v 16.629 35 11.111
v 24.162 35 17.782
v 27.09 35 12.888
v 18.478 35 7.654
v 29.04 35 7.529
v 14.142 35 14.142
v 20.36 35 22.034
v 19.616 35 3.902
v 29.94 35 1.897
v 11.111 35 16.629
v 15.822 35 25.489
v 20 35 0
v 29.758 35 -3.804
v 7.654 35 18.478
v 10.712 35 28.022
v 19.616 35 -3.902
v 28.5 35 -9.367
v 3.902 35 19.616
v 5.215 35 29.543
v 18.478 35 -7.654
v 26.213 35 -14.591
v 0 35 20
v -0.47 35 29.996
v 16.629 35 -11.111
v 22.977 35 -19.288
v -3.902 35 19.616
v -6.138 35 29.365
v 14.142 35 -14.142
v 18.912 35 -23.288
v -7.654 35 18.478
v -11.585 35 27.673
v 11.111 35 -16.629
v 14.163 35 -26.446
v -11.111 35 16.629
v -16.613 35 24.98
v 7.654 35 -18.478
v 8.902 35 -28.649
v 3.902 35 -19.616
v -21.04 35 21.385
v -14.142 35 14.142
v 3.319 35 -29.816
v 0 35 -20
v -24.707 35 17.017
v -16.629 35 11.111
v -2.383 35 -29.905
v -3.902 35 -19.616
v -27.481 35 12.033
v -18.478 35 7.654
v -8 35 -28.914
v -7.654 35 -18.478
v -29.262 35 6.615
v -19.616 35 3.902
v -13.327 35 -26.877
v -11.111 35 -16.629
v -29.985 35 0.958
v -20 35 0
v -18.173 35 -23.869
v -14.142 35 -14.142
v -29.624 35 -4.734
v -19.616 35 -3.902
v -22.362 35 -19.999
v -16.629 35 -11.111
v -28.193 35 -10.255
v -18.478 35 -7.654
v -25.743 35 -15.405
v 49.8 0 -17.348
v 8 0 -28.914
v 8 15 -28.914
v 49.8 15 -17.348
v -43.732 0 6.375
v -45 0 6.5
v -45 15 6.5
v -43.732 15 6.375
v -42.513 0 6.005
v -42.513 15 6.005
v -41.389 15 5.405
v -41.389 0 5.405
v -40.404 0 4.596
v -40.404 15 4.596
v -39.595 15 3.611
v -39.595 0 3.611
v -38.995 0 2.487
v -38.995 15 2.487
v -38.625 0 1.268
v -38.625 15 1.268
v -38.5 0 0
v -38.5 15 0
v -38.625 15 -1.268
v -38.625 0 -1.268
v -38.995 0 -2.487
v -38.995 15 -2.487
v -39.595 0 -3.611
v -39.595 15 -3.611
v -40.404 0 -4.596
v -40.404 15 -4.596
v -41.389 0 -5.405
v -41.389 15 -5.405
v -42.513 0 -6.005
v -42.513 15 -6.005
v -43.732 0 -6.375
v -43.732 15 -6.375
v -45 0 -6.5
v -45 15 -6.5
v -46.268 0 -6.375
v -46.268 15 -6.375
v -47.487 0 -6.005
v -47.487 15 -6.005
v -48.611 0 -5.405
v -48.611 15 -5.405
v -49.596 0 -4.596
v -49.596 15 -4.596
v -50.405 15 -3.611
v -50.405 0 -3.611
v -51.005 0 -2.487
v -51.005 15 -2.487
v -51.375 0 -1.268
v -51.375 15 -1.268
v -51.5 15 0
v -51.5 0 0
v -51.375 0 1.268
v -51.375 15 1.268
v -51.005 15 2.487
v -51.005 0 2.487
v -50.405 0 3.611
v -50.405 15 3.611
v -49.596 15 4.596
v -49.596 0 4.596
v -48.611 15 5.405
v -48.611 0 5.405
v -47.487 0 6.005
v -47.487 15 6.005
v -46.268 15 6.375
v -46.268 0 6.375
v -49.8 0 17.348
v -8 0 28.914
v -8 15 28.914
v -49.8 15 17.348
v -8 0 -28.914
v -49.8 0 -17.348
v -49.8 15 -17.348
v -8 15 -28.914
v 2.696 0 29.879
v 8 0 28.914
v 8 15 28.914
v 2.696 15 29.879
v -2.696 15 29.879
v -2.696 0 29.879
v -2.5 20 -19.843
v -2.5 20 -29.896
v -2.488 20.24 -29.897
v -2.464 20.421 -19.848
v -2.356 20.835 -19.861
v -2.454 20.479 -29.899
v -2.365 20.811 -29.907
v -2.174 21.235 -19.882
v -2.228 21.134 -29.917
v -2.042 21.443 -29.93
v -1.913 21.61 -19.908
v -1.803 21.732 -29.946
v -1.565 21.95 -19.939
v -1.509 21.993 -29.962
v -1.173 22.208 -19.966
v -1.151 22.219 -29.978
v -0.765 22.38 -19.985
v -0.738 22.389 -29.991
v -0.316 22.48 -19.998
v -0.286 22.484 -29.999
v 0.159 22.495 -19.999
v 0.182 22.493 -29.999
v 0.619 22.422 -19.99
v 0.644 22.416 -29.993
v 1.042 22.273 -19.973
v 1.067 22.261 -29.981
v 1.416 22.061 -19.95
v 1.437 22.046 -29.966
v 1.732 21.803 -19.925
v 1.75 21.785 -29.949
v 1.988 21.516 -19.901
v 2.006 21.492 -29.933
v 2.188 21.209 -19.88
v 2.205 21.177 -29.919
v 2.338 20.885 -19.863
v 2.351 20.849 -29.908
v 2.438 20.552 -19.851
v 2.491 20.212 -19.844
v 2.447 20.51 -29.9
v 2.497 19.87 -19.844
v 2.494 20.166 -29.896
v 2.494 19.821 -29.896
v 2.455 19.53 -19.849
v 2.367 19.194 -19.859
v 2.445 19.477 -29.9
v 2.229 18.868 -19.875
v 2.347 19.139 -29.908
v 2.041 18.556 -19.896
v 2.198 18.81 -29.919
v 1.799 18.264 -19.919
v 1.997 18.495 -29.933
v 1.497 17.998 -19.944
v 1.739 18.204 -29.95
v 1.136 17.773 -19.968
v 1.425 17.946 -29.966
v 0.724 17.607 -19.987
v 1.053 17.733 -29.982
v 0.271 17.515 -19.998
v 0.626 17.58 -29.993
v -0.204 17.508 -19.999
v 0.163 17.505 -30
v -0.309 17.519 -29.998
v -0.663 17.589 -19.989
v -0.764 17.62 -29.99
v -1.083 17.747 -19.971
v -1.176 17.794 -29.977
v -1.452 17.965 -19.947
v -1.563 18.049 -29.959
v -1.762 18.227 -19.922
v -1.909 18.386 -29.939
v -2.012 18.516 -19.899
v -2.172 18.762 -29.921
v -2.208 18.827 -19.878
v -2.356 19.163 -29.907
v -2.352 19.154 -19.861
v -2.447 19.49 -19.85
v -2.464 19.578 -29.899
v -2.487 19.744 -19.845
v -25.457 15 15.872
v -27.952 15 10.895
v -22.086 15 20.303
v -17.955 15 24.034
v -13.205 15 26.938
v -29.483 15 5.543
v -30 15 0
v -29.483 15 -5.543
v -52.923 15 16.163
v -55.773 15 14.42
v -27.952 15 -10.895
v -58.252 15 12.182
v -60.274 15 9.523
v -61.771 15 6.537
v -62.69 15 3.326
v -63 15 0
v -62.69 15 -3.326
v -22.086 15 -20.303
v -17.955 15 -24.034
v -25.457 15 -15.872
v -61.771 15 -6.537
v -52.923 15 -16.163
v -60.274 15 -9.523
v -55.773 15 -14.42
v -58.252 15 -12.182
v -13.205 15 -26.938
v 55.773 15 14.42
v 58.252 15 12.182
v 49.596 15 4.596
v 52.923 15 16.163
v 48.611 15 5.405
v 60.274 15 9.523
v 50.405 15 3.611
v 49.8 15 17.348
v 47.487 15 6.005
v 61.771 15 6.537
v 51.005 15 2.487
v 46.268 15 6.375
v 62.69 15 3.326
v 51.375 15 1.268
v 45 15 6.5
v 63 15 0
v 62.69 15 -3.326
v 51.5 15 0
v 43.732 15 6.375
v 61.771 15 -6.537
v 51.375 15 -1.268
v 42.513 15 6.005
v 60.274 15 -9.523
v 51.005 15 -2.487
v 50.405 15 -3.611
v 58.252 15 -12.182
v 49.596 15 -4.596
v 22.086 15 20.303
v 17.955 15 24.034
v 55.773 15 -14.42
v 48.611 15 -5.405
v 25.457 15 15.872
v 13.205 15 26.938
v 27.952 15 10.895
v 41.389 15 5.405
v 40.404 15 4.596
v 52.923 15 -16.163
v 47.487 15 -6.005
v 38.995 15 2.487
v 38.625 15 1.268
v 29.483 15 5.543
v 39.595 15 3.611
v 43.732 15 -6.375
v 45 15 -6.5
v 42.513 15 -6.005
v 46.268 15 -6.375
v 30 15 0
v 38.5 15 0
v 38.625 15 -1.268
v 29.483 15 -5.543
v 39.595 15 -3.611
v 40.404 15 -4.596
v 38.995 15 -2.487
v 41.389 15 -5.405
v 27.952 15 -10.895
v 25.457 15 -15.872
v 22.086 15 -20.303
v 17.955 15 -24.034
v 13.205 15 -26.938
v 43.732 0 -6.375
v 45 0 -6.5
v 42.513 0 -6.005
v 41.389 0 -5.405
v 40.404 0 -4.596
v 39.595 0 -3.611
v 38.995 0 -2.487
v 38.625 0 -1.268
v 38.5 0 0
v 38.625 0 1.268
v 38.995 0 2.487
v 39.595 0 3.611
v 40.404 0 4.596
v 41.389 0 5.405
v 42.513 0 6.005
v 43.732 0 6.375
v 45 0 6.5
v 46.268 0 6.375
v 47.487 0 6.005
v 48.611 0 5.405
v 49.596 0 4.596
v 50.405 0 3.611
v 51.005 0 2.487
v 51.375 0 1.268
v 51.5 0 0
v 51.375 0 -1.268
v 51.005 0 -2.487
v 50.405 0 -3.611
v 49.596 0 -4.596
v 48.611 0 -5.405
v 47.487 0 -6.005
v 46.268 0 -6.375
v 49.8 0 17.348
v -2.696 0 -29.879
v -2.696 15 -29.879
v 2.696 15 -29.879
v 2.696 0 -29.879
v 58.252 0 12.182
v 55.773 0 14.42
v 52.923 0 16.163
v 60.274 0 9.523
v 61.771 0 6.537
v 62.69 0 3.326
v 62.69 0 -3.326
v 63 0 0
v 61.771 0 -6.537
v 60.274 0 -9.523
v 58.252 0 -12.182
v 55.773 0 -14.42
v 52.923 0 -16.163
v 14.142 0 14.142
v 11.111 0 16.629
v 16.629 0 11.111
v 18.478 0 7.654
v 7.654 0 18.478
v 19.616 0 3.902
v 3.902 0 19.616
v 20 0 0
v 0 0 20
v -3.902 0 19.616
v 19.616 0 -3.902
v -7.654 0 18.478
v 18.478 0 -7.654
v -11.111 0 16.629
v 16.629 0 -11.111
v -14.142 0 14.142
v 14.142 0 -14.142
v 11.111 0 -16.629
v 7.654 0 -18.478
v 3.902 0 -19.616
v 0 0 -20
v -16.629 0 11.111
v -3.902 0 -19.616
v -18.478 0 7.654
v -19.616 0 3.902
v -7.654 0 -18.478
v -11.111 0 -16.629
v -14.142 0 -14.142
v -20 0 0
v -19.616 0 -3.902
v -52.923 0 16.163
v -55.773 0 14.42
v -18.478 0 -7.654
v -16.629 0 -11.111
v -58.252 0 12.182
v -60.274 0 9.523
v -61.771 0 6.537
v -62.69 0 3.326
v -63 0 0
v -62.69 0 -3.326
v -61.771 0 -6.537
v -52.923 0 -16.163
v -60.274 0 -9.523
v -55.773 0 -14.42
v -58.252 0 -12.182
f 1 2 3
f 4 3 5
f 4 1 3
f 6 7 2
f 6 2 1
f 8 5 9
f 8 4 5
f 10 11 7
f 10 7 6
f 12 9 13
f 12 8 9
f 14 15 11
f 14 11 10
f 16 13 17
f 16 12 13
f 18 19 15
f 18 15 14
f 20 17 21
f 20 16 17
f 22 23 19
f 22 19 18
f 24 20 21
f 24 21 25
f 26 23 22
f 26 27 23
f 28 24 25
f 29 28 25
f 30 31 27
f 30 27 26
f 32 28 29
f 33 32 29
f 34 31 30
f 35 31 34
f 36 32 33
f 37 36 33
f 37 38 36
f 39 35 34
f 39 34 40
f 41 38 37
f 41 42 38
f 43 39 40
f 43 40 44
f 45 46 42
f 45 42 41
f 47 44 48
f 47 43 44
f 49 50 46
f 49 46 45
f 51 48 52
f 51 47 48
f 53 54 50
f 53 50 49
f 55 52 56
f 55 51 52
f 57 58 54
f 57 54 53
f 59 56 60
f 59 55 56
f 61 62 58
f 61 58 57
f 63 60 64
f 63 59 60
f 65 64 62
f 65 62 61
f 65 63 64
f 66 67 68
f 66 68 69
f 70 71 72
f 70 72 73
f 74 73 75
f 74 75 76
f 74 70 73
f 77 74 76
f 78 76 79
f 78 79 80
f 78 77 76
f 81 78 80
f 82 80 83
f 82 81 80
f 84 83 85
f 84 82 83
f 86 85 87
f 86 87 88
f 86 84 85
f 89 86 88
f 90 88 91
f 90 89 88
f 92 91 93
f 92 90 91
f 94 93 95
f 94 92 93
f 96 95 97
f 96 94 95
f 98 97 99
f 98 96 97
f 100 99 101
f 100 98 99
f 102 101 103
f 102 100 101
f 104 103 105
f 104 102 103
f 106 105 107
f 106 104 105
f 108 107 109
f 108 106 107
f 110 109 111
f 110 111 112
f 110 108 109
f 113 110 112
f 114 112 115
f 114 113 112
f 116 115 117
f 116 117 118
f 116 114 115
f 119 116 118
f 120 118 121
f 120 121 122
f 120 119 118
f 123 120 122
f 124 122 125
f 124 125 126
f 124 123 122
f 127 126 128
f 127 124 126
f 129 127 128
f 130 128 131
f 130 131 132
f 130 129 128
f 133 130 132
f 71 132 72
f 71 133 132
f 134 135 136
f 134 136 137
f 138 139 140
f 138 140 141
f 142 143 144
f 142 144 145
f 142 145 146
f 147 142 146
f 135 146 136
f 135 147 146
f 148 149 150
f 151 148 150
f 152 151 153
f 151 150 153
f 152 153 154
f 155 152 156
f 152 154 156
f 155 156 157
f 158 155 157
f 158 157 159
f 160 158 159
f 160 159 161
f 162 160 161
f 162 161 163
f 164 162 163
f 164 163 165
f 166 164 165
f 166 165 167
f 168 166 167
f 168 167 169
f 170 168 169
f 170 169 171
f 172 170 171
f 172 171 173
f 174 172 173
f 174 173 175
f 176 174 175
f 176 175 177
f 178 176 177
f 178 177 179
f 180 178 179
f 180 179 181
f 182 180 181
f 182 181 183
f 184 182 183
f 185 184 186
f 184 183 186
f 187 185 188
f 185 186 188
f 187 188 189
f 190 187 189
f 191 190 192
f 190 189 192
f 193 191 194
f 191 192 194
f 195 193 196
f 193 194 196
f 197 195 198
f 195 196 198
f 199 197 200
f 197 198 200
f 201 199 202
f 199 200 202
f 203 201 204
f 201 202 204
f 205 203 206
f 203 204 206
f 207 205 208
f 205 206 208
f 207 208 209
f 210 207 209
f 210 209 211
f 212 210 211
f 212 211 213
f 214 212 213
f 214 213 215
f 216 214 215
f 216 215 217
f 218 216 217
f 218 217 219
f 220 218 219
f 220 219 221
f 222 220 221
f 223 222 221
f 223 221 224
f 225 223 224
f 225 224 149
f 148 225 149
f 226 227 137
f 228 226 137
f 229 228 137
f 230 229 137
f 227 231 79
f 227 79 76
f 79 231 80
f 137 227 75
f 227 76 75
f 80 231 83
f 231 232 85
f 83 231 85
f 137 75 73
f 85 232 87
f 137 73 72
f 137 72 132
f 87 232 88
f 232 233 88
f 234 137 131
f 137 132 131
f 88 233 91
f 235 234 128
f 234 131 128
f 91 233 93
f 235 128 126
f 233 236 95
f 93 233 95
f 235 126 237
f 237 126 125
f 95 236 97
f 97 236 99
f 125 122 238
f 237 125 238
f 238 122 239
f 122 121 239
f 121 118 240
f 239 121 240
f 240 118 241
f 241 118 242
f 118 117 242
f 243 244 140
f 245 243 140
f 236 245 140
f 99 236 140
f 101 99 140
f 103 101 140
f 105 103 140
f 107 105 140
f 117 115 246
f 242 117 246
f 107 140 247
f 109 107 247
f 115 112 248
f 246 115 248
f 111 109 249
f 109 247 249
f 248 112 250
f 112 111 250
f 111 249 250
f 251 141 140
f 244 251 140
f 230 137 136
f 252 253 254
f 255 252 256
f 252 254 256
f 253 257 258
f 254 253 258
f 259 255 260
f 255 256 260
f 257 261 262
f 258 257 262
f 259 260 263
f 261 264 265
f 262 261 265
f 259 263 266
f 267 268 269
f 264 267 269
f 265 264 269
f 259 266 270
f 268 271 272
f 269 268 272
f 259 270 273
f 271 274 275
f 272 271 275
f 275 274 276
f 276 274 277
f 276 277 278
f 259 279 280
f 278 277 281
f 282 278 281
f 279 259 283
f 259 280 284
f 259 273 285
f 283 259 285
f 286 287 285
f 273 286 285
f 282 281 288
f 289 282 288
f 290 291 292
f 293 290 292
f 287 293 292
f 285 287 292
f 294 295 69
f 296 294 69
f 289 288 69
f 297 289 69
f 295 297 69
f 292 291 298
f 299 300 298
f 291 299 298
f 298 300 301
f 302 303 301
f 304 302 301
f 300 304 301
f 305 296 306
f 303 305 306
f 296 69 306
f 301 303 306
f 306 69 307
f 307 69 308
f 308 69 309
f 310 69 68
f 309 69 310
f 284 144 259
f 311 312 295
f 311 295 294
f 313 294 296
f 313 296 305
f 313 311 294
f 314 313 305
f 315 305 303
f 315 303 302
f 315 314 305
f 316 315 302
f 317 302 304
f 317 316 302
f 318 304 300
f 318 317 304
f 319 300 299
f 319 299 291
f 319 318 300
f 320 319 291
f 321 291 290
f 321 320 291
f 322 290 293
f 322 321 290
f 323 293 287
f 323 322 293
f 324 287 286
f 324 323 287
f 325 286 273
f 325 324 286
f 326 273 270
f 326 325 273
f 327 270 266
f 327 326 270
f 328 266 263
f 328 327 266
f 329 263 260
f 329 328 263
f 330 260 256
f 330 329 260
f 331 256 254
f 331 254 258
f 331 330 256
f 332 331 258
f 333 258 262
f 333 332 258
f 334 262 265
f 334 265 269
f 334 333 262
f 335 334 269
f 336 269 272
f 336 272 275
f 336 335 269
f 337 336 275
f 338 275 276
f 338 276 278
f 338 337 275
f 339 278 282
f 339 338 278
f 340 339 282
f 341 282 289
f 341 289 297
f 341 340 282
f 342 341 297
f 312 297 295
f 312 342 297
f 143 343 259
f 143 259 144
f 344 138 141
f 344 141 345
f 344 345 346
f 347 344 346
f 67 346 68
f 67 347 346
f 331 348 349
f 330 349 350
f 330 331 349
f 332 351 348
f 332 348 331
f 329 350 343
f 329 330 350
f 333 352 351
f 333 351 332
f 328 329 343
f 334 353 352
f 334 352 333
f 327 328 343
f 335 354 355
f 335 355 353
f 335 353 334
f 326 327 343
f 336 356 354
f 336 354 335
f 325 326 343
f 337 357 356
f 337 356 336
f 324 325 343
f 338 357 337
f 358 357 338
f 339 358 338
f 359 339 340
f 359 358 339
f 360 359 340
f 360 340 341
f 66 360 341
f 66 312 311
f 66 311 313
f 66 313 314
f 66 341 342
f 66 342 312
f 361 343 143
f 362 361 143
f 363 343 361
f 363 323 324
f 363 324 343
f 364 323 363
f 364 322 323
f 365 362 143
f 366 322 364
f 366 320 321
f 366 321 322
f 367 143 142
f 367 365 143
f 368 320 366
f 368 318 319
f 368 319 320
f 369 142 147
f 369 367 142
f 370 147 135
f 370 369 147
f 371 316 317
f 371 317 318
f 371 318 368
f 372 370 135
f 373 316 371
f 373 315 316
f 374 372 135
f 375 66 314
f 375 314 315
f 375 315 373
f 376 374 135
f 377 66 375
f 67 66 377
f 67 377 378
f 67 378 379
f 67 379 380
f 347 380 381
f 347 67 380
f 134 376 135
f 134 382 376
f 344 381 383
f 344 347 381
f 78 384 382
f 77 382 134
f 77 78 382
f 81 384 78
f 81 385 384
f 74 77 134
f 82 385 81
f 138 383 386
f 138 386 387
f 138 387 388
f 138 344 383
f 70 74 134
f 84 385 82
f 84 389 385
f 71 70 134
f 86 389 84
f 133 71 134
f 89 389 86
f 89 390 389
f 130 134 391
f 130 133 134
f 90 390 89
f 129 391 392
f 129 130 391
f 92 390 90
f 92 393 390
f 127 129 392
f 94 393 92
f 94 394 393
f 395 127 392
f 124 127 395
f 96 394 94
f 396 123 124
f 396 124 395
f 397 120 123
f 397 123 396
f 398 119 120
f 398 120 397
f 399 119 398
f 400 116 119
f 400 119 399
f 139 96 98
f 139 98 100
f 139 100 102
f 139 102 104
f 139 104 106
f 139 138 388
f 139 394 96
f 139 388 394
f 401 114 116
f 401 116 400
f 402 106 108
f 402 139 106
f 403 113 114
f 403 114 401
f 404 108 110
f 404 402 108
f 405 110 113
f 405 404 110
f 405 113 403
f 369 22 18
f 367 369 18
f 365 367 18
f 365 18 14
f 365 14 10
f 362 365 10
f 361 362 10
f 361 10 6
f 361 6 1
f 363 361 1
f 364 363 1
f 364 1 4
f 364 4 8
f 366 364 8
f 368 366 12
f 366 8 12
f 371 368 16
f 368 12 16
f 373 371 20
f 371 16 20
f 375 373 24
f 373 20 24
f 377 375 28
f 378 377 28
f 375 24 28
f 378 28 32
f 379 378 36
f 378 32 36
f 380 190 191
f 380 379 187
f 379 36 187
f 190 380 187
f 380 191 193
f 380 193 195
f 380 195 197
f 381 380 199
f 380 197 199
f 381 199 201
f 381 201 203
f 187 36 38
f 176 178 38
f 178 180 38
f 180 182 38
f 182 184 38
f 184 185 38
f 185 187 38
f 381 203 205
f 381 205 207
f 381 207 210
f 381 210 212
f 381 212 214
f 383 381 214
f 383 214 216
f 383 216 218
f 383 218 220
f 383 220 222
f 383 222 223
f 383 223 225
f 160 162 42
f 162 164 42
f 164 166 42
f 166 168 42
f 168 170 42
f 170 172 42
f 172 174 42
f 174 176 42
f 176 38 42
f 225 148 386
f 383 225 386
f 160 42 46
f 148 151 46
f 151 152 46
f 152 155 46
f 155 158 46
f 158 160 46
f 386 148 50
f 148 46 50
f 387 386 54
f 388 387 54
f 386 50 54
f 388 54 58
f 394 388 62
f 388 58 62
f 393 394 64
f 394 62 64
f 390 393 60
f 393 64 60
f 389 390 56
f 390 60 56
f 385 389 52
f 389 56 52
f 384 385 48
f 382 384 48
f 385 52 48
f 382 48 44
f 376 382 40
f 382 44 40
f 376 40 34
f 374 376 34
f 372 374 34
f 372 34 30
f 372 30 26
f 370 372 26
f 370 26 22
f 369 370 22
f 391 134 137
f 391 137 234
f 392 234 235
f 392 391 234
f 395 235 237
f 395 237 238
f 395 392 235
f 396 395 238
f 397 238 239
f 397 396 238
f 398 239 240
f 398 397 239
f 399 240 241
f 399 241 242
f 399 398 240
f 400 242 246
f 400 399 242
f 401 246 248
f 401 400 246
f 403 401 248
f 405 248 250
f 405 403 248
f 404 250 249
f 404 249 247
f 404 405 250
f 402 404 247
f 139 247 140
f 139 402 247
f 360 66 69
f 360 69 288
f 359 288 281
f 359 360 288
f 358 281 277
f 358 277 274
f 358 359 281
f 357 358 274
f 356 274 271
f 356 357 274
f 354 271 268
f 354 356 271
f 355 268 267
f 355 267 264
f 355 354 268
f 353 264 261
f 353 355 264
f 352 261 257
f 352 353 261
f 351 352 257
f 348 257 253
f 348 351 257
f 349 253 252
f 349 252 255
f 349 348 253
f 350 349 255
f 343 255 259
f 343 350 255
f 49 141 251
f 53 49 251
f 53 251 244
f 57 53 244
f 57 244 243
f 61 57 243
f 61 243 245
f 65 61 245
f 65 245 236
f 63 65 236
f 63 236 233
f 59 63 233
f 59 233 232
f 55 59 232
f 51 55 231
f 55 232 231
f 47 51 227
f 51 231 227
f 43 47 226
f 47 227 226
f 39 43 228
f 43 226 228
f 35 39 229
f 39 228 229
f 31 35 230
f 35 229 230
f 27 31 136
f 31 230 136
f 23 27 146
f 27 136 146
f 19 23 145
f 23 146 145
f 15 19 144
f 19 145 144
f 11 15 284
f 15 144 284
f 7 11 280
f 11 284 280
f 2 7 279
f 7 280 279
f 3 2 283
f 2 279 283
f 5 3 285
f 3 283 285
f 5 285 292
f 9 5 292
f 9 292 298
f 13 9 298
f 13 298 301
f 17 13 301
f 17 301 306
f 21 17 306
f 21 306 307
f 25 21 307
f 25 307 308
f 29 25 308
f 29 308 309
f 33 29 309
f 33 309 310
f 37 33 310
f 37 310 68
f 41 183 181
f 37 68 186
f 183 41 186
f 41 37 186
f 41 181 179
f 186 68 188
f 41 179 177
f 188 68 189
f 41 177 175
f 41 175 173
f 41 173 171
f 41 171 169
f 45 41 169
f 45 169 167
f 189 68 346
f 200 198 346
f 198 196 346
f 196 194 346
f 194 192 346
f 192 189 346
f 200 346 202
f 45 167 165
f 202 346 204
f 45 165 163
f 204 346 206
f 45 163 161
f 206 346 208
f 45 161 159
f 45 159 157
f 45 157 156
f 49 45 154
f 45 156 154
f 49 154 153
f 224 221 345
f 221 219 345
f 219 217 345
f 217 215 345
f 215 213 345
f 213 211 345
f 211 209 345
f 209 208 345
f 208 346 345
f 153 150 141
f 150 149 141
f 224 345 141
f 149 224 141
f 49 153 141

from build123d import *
from build123d.topology import SkipClean

# Parameters (mm, degrees)
IZIM1_R                     = 6.5
Y_KSEKLIK_EKSTR_ZYON2_DEPTH = 15
IZIM2_R                     = 30
Y_KSEKLIK_EKSTR_ZYON3_DEPTH = 20
IZIM3_R                     = 20
KES_EKSTR_ZYON2_DEPTH       = 83
IZIM4_R                     = 2.5
KES_EKSTR_ZYON3_DEPTH       = 15


with BuildPart() as part:
    # Çizim1 → Yükseklik-Ekstrüzyon2 (new body)
    with BuildSketch(Plane(origin=(0, 0, 0), x_dir=(1, 0, 0), z_dir=(0, 1, 0))):
        with BuildLine():
            Line((-49.8, 17.348198754), (-8, 28.91366459))
            ThreePointArc((-8, 28.91366459), (0, 30), (8, 28.91366459))
            Line((8, 28.91366459), (49.8, 17.348198754))
            ThreePointArc((49.8, 17.348198754), (63, 0), (49.8, -17.348198754))
            Line((49.8, -17.348198754), (8, -28.91366459))
            ThreePointArc((8, -28.91366459), (0, -30), (-8, -28.91366459))
            Line((-8, -28.91366459), (-49.8, -17.348198754))
            ThreePointArc((-49.8, -17.348198754), (-63, 0), (-49.8, 17.348198754))
        make_face()
        with Locations(Location((-45, 0, 0), (0, 0, 270))):
            Circle(IZIM1_R, mode=Mode.SUBTRACT)
        with Locations(Location((45, 0, 0), (0, 0, 90))):
            Circle(IZIM1_R, mode=Mode.SUBTRACT)
    extrude(amount=Y_KSEKLIK_EKSTR_ZYON2_DEPTH)

    # Çizim2 → Yükseklik-Ekstrüzyon3 (add)
    with SkipClean():  # the faces are left unmerged after this step: merging them gives an invalid solid
        with BuildSketch(Plane(origin=(0, 15, 0), x_dir=(1, 0, 0), z_dir=(0, 1, 0))):
            with Locations(Location((0, 0, 0), (0, 0, 105.466009953))):
                Circle(IZIM2_R)
        extrude(amount=Y_KSEKLIK_EKSTR_ZYON3_DEPTH)

    # Çizim3 → Kes-Ekstrüzyon2 (cut)
    with SkipClean():  # the faces are left unmerged after this step: merging them gives an invalid solid
        with BuildSketch(Plane(origin=(0, 35, 0), x_dir=(1, 0, 0), z_dir=(0, 1, 0))):
            with Locations(Location((0, 0, 0), (0, 0, 270))):
                Circle(IZIM3_R)
        extrude(amount=-KES_EKSTR_ZYON2_DEPTH, mode=Mode.SUBTRACT)

    # Çizim4 → Kes-Ekstrüzyon3 (cut)
    with BuildSketch(Plane(origin=(0, 0, -30), x_dir=(-1, 0, 0), z_dir=(0, 0, -1))):
        with Locations((0, 20)):
            Circle(IZIM4_R)
    extrude(amount=-KES_EKSTR_ZYON3_DEPTH, mode=Mode.SUBTRACT)


solid = part.part
